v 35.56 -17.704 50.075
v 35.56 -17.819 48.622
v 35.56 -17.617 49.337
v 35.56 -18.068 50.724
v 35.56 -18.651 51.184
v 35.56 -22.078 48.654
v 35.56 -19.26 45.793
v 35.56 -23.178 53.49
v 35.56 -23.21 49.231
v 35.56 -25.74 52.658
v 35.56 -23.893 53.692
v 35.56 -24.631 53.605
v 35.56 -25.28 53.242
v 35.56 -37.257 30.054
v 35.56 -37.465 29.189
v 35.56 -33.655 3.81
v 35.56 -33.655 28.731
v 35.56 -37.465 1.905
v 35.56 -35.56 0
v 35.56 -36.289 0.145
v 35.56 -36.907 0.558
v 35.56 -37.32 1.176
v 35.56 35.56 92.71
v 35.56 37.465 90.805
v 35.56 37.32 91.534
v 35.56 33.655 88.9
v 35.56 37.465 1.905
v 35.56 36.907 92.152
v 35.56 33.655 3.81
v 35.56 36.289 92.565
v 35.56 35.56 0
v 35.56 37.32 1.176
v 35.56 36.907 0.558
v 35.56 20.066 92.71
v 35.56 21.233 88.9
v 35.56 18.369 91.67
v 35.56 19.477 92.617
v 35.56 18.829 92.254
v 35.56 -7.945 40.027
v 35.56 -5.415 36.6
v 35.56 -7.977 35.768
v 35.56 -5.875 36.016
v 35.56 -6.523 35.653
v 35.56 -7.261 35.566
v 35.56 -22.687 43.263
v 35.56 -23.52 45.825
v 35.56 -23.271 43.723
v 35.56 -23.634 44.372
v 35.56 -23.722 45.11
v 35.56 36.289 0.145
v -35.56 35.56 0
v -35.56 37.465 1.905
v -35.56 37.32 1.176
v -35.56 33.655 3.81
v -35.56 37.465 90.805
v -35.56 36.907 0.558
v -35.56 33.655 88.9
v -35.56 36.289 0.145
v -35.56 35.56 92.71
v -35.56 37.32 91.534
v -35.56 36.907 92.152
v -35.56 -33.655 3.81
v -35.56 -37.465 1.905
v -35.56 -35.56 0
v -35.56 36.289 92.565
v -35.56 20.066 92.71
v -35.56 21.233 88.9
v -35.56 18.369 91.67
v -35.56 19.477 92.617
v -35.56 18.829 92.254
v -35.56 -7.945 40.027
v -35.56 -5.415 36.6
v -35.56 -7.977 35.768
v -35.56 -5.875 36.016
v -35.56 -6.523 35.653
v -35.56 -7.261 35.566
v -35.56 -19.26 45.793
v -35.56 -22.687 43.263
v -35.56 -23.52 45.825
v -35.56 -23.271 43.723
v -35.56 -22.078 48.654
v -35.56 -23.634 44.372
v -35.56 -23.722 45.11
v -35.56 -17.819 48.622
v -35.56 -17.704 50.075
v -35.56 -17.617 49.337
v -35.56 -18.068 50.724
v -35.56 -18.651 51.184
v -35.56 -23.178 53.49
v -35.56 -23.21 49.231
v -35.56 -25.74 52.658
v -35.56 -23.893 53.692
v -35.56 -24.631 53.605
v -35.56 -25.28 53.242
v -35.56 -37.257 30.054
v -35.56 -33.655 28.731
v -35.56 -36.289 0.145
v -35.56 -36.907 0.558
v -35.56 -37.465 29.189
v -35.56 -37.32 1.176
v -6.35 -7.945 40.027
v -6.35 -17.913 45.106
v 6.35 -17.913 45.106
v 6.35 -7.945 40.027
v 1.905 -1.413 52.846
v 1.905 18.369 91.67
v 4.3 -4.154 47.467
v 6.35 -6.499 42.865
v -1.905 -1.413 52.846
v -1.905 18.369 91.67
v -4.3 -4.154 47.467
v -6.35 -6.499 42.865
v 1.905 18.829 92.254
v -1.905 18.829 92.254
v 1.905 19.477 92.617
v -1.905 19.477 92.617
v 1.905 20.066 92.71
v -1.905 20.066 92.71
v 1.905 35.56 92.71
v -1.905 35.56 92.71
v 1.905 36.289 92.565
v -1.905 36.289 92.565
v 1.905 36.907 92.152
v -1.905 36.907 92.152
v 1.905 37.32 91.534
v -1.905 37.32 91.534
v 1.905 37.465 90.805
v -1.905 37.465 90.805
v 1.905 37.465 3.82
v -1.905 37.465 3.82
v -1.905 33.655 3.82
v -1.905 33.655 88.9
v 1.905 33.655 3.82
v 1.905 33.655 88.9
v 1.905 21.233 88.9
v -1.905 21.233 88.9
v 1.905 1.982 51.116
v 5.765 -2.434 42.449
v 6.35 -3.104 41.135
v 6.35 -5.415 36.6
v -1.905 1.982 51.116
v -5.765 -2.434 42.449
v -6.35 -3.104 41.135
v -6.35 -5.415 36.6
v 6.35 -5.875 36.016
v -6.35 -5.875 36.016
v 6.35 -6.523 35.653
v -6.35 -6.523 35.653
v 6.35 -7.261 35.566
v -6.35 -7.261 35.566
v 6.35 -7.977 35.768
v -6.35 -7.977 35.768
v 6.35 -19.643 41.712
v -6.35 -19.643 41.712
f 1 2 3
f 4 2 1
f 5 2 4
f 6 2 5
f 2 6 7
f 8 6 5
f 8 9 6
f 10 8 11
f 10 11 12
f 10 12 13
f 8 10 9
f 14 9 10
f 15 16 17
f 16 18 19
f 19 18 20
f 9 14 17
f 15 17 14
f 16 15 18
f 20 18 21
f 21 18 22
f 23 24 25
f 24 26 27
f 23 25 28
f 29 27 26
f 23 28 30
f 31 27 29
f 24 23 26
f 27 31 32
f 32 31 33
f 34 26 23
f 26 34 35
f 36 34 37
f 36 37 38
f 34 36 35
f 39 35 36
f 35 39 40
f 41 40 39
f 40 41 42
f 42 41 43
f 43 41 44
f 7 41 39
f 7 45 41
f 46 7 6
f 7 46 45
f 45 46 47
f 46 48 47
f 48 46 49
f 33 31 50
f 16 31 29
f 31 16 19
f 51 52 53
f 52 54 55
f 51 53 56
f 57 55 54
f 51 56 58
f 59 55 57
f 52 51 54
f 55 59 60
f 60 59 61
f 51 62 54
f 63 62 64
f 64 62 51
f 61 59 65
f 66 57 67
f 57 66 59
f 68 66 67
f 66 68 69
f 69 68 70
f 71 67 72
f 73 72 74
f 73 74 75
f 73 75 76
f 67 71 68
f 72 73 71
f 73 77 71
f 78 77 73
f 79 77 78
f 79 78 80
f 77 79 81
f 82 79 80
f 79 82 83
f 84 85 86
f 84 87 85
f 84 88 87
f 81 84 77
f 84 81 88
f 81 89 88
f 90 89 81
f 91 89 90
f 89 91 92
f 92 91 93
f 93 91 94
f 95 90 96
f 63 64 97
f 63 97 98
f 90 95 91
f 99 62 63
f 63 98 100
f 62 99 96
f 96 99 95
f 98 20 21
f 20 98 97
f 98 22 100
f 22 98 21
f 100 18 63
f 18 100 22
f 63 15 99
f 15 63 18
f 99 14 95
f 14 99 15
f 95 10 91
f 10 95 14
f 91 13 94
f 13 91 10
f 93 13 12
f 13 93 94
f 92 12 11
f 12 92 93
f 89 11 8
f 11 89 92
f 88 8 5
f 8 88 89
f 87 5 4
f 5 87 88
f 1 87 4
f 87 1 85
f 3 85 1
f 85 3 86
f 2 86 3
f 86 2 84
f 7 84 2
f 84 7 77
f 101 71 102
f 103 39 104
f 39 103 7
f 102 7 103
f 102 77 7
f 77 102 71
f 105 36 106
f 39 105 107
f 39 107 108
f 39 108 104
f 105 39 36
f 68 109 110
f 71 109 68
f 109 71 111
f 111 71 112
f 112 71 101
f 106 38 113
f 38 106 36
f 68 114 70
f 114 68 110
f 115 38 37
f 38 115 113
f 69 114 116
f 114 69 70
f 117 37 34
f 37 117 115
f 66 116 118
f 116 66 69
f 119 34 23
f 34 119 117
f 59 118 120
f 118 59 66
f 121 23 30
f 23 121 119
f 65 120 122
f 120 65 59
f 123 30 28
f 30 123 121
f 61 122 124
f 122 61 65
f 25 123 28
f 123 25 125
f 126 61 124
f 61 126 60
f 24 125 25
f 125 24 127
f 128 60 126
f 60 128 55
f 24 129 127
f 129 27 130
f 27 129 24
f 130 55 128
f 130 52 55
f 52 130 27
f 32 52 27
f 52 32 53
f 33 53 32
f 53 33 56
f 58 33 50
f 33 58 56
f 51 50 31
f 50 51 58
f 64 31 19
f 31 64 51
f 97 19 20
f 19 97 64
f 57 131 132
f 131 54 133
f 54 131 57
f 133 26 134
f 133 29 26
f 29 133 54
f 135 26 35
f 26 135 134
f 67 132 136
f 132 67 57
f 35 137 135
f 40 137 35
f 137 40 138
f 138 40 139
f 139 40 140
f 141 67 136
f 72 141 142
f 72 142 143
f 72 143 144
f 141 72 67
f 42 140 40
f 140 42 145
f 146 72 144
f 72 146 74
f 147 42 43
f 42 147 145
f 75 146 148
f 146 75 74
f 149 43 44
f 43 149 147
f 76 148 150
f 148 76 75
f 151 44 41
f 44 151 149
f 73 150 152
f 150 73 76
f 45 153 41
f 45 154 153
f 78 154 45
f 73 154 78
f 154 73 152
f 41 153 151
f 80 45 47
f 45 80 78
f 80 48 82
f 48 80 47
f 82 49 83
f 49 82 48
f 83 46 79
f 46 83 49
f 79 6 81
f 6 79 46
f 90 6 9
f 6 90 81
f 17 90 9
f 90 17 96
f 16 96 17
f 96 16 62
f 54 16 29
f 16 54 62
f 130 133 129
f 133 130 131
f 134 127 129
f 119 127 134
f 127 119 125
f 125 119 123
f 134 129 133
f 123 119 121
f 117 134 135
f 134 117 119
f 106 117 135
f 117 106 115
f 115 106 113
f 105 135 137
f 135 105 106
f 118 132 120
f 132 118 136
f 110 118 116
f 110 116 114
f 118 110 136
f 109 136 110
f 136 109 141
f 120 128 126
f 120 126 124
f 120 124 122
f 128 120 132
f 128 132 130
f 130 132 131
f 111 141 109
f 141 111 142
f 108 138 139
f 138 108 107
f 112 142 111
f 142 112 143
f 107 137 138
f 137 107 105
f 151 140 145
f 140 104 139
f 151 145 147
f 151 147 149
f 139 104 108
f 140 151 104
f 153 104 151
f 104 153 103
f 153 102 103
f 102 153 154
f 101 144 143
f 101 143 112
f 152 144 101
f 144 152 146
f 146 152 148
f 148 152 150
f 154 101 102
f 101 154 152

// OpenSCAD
// 
// Customizable Phone Stand
// version 1.0   11/21/2015
// by Steve Van Ausdall (DaoZenCiaoYen @ Thingiverse)
//

// preview[view:west, tilt:top diagonal]

/* [Main] */
// in inches
stand_height = 3.5 ; // [2:0.1:5]
// in inches
stand_width = 2.8 ; // [2:0.1:5]
// in inches
stand_depth = 2.8 ; // [2:0.1:5]
// in inches
phone_depth = 0.5 ; // [0.3:0.1:1]
// in inches
phone_lip = 0.2 ; // [0:0.1:0.5]
// in degrees
phone_angle = 27 ; // [10:35]
// in percent of stand depth
phone_adjust_depth_pct = 10 ; // [-20:1:10]
// in percent of stand height
phone_adjust_height_pct = -10 ; // [-20:1:10]
// the hole for the charger connetor in inches
charger_width = 0.5 ; // [0:0.1:1.5]
// the width of the charger cord in inches
cord_width = 0.15 ; // [0:0.05:1.5]
// in percent of possible height
slot_taper_pct = 30 ; // [0:5:100]
// in inches
wall_thickness = 0.15 ; // [0.1:0.05:0.5]

/* [Hidden] */
mm_in = 25.4 ;
thick = mm(wall_thickness) ;
phone_y = (stand_height/2) + (phone_adjust_height_pct*stand_height/100) ;
phone_x = (stand_depth/2) + (phone_adjust_depth_pct*stand_depth/100) ;
slot_taper = (stand_height - phone_y) * slot_taper_pct/100 ;
ff = 0.01 ;
bf = 1 ;
$fn=16 ;

function mm(in) = in * mm_in ;

main();

module main()
{
  render(convexity = 3) 
    rotate_z(2)
    difference()
    {
      stand();
      cord_slot();
      charger_slot();
    }
}

module rotate_z(yn)
{
  if (yn == 0) 
  {
    children(0);
  }
  else if (yn == 1)
  {
    rotate([0,0,180])
      translate([mm(-stand_depth/2),mm(-stand_height/2)-thick/2,mm(stand_width/2)])
      children(0);
  }
  else 
  {
    rotate([0,0,-90])
      translate([mm(-stand_depth/2),0,thick/2])
      rotate([90,0,0])
      children(0) ;
  }
}

module cord_slot()
{
  translate([-thick,thick*1.5+ff,mm(-cord_width/2)])
    linear_extrude(height=mm(cord_width)) 
    offset(thick) 
    cord_slot_shape();
}

module charger_slot()
{
  translate([mm(phone_x)-thick/2,mm(phone_y)-thick,0])
    rotate([0,0,phone_angle])
    rotate([0,90,0])
    linear_extrude(height=mm(phone_depth)+thick+ff)
    polygon(points=[
      [0,mm(slot_taper)+thick*2],
      [mm(charger_width/2),thick*2],[mm(charger_width/2),0],
      [-mm(charger_width/2),0],[-mm(charger_width/2),thick*2]
    ]);
}

module stand()
{
  translate([0,0,mm(-stand_width/2)])
    linear_extrude(height=mm(stand_width)) 
    stand_outline();
}

module stand_outline()
{
  difference()
  {
    offset(r=thick/2) stand_shape();
    offset(r=-thick/2) stand_shape();
  }
}

module cord_slot_shape()
{
  square([mm(phone_x)+thick/2,mm(stand_height)]);
}

module stand_shape()
{
  difference()
  {
    square([mm(stand_depth),mm(stand_height)]);
    translate([mm(phone_x),mm(phone_y)])
      rotate([0,0,phone_angle])
      translate([0,mm(-phone_y-bf)])
      difference()
      {
        square([mm(stand_depth+bf),mm(stand_height+bf*2)]);
        square([mm(phone_depth)+thick,mm(phone_y+bf)]);
        translate([mm(phone_depth)+thick,0])
          square([mm(phone_lip),mm(phone_y+bf+phone_lip)]);
      };
  }
}
